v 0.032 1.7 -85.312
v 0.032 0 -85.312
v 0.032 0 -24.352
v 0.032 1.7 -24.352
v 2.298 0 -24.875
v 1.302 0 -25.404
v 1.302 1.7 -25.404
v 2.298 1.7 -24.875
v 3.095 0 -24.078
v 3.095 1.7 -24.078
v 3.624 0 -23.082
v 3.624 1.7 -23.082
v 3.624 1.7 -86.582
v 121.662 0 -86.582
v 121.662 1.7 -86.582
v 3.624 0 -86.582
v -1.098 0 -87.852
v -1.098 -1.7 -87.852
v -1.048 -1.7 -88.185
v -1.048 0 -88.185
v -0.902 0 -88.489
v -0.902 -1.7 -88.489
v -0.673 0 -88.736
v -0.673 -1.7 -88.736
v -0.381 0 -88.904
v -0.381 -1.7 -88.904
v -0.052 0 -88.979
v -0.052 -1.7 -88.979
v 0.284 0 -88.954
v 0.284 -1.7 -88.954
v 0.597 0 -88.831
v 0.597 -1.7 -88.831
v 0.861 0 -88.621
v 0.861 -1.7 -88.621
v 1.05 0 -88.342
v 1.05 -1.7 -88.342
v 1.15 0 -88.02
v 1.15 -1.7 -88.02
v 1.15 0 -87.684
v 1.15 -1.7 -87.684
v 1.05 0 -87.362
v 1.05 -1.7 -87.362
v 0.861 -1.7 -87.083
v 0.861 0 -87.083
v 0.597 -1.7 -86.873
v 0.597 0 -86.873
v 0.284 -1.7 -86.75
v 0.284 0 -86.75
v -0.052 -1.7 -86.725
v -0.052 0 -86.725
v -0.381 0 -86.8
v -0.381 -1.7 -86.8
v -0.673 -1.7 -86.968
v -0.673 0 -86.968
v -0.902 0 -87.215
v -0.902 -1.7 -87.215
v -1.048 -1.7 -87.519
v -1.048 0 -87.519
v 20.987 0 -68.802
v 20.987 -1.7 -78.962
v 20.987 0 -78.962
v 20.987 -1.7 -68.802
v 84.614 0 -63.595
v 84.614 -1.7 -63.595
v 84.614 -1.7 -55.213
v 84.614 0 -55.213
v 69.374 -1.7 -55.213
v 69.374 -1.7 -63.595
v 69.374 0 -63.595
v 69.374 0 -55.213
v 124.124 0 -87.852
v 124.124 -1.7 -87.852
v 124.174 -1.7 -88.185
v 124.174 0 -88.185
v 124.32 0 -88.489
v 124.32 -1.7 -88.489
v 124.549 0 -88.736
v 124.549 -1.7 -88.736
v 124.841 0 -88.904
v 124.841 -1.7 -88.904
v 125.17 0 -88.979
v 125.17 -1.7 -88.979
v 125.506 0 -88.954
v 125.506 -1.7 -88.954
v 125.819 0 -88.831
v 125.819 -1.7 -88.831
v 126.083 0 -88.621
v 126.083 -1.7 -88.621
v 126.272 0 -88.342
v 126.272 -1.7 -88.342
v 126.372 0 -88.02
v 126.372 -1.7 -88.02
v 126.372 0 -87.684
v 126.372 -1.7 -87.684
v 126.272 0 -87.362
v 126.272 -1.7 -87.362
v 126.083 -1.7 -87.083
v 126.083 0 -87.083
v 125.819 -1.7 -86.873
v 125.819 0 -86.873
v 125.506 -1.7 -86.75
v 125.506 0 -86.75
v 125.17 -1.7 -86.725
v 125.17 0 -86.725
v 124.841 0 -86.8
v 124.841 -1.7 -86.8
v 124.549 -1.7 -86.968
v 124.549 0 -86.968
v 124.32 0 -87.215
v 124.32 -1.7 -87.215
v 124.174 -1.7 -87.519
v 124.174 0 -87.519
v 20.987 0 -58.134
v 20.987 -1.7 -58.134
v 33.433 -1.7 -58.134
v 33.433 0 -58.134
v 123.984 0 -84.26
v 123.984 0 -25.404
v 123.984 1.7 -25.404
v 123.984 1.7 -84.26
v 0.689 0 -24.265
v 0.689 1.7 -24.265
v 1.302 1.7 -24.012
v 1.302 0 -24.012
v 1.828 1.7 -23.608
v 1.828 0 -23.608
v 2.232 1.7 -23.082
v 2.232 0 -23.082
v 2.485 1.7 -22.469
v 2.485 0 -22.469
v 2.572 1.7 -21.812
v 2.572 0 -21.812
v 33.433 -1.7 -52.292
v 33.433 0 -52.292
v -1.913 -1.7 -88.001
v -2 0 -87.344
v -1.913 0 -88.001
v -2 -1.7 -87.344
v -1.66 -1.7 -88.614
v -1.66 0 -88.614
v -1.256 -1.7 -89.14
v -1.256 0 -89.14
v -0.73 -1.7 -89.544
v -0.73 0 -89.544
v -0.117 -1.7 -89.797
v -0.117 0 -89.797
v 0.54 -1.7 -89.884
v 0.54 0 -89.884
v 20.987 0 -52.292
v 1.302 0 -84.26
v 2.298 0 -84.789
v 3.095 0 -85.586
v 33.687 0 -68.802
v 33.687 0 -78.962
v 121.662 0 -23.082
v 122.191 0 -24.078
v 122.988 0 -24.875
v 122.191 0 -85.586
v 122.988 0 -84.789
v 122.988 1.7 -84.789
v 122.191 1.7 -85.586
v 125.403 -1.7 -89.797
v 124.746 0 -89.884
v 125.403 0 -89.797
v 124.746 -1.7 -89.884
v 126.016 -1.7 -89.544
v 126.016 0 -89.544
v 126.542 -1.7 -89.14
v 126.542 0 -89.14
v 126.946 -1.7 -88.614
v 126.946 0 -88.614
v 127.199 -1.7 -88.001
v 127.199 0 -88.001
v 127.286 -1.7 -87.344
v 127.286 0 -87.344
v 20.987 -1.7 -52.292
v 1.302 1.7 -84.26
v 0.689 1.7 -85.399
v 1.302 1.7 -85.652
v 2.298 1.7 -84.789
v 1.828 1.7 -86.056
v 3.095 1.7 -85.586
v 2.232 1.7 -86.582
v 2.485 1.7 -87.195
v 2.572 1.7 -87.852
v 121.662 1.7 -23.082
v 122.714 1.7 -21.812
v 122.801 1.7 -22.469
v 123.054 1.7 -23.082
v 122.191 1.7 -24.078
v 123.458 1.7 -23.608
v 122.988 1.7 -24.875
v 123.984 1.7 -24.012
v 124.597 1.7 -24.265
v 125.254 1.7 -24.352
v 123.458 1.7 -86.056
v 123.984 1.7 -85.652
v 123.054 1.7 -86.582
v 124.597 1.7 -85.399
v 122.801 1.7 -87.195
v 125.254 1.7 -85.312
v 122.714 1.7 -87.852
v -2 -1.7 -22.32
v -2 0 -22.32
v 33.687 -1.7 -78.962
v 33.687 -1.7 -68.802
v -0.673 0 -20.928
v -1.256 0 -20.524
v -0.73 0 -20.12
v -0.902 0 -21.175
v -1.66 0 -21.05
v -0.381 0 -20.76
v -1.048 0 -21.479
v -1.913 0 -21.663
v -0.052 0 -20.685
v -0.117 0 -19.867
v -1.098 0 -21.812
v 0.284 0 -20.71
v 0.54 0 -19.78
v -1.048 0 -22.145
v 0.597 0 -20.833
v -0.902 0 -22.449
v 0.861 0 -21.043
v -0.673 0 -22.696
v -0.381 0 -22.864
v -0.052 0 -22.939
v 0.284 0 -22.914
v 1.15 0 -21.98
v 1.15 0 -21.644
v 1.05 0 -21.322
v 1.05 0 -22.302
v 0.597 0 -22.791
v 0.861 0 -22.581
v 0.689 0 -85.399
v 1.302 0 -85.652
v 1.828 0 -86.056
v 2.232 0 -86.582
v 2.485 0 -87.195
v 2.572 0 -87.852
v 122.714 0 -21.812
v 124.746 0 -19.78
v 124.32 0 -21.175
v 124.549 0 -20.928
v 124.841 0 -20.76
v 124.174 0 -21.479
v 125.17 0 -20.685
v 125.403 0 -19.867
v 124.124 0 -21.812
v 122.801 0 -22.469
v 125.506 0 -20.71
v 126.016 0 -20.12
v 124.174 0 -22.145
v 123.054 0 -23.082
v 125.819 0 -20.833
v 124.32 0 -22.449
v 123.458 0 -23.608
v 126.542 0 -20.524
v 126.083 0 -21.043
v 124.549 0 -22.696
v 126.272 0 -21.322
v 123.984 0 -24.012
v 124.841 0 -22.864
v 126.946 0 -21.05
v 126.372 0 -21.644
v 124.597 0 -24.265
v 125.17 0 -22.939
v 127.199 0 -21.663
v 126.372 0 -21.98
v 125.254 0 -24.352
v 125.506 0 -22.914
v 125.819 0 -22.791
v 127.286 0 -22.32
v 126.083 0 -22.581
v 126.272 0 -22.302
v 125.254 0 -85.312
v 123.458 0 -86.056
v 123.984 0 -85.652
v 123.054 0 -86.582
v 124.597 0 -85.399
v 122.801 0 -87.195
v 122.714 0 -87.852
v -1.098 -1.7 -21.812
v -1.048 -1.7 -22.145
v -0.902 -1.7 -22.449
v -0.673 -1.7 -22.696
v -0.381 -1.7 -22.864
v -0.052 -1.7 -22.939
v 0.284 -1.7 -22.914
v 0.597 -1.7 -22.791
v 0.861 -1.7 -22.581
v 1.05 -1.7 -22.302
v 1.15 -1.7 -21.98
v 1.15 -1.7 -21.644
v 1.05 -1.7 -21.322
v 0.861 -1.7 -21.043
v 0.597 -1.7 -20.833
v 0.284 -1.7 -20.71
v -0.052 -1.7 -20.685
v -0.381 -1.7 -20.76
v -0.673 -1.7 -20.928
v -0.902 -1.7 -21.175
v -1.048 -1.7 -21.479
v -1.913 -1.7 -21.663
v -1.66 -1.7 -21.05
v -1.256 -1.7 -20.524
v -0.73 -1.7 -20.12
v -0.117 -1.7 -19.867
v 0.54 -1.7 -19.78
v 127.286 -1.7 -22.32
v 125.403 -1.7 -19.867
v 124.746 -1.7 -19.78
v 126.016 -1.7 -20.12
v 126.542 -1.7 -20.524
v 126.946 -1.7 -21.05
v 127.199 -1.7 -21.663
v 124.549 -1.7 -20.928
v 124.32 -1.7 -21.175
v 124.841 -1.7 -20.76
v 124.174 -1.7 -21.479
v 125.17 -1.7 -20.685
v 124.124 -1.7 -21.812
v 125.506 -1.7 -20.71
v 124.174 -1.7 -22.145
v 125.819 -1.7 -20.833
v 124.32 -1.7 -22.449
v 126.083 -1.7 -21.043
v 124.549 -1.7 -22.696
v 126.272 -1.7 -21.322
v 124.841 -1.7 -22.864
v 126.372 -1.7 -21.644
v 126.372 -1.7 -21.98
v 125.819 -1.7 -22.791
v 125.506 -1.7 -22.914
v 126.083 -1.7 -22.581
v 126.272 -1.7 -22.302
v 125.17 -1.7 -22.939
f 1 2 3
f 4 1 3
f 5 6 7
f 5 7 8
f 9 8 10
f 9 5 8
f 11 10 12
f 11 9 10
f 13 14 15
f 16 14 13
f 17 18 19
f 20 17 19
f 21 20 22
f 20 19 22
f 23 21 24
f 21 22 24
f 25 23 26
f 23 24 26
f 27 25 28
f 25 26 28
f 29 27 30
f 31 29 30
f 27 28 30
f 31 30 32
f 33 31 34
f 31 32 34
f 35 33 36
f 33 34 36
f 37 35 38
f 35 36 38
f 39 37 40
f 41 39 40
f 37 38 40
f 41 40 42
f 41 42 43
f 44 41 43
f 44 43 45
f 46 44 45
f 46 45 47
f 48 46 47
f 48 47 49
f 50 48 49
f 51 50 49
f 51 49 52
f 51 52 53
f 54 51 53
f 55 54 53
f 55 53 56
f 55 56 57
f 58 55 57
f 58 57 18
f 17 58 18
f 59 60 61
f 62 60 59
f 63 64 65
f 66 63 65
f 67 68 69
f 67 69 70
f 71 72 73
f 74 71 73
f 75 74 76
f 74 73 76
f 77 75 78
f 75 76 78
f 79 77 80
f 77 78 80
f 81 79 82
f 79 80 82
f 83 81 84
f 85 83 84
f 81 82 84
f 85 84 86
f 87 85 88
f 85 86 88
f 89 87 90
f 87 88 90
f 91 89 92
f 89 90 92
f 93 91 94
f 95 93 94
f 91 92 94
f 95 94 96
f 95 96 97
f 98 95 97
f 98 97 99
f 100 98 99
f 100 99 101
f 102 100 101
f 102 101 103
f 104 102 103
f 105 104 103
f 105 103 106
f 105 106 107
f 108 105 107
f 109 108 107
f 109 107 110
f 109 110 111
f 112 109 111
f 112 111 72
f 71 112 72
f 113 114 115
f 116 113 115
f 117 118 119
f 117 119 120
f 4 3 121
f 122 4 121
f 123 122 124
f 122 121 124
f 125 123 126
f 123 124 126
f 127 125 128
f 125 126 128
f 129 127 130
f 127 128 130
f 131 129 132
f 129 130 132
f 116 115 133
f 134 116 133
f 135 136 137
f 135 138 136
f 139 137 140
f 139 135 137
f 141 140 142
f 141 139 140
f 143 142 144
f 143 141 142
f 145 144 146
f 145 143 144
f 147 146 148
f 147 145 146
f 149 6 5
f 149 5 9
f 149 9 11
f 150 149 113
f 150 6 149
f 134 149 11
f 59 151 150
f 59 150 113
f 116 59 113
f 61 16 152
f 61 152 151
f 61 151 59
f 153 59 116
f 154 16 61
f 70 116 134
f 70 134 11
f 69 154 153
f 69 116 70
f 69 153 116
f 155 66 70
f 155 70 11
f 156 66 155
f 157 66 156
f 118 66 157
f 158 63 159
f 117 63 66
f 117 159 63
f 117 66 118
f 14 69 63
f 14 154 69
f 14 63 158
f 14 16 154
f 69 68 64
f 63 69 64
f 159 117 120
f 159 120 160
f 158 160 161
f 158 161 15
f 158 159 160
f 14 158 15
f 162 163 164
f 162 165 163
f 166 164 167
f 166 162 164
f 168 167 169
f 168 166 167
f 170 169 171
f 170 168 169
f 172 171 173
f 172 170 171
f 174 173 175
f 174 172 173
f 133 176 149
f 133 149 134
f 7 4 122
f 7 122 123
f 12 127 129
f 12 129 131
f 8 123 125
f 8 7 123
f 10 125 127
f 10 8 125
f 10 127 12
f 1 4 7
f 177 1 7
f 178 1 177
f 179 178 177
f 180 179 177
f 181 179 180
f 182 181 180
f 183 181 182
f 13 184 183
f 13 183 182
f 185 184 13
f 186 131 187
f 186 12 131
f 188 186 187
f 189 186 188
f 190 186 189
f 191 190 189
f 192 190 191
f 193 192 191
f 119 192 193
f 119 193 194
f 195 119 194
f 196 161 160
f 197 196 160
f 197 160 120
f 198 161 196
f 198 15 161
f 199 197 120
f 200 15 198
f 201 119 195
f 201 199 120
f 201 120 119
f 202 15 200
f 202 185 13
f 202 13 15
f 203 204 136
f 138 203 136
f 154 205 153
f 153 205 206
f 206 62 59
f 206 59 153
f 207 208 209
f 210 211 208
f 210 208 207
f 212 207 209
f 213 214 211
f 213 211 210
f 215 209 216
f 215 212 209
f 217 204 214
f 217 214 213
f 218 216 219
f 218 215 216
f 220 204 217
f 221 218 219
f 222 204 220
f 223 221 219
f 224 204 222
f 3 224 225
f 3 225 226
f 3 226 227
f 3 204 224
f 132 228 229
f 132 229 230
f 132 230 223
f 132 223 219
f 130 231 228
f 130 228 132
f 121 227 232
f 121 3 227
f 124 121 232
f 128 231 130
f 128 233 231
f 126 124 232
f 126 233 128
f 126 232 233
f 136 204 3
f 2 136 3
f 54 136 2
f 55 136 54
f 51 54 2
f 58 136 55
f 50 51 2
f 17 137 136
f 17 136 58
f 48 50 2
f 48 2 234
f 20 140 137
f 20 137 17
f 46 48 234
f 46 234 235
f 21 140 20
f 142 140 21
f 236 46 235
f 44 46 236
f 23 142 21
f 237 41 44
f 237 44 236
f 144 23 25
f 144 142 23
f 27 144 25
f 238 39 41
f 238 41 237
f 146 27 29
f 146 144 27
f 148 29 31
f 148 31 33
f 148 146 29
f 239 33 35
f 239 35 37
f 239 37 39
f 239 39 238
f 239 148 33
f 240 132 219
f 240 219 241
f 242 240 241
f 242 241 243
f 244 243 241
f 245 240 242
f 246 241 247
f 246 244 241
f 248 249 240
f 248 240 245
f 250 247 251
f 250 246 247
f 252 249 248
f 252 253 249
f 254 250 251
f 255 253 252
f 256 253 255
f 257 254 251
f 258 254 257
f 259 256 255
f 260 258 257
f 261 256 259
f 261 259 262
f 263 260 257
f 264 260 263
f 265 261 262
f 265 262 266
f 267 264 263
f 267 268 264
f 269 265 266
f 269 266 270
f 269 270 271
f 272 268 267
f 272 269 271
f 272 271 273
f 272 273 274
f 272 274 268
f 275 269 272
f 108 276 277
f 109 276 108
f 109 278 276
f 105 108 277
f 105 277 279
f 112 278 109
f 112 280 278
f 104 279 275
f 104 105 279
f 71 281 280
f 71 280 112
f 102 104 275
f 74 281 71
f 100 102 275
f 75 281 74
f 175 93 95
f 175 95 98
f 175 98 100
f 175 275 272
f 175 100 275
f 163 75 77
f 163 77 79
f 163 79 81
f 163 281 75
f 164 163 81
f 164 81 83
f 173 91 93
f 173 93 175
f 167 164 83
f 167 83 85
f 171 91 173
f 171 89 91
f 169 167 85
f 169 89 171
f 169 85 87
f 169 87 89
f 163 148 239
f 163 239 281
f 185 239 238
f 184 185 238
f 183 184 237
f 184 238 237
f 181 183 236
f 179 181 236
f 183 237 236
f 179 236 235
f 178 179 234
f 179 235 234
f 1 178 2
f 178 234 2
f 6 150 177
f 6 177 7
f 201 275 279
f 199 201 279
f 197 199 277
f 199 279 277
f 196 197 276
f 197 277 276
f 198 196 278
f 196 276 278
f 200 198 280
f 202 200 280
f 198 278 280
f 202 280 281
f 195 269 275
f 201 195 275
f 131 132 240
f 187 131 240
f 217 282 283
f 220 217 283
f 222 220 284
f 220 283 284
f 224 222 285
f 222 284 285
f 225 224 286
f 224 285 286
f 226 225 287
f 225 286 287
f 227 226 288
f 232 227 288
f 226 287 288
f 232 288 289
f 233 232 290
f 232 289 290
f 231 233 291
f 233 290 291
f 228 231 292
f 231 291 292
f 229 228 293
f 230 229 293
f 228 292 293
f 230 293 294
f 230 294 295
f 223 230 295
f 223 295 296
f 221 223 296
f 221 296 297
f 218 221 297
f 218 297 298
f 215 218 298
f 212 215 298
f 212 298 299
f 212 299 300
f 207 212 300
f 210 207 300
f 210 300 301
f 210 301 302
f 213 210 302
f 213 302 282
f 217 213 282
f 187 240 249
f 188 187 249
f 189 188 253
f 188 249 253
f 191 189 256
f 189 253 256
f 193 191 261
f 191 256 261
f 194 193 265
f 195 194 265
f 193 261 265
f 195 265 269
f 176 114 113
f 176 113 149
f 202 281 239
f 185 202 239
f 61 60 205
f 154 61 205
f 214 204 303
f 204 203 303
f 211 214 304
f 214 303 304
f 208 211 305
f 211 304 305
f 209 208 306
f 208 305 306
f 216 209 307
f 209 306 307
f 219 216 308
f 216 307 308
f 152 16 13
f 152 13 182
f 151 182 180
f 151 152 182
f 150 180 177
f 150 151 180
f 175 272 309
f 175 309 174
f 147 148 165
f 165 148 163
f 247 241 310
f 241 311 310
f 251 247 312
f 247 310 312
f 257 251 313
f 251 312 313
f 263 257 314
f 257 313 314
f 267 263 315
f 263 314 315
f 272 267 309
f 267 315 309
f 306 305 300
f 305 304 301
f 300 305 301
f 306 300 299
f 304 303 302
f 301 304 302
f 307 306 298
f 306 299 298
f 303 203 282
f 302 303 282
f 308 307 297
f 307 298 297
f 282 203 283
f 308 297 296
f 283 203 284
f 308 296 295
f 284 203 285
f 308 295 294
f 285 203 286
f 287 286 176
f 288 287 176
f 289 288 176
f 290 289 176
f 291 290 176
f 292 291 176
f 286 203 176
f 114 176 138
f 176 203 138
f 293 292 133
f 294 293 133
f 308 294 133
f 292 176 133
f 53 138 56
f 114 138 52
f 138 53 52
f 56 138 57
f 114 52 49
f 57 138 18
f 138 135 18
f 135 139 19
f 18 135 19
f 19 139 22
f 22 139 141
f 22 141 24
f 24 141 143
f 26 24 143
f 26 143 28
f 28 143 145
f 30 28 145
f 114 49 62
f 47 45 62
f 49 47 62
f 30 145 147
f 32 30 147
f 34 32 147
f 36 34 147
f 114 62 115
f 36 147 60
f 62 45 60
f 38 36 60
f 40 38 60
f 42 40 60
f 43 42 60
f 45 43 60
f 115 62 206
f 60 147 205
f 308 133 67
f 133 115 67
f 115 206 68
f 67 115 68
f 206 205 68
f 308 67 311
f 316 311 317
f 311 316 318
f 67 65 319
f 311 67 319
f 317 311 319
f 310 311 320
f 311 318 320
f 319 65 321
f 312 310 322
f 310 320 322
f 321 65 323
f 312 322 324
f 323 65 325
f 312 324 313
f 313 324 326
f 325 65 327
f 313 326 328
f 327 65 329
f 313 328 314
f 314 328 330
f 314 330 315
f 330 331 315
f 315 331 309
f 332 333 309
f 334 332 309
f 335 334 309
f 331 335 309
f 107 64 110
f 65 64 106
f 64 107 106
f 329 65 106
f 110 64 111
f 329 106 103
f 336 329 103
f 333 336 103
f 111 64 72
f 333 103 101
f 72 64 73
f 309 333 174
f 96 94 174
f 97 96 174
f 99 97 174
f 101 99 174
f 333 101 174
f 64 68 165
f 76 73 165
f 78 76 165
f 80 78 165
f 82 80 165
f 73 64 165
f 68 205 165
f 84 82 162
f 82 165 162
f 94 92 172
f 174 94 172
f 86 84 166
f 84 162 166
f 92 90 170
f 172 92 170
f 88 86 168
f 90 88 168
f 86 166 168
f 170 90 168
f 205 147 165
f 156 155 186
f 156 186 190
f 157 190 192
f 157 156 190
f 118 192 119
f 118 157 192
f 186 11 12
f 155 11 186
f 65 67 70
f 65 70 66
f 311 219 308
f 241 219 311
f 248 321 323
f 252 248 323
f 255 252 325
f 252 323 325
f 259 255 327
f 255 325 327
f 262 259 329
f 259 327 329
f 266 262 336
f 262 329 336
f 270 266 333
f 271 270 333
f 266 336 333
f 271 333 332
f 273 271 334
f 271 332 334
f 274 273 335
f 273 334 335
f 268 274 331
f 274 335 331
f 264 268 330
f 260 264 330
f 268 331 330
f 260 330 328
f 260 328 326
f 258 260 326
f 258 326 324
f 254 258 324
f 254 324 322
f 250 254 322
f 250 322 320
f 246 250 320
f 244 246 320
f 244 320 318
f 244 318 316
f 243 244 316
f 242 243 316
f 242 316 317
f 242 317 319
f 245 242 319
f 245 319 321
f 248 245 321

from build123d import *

# Parameters (mm, degrees)
SKETCH20_W            = 129.286
SKETCH20_H            = 70.104
BOSS_EXTRUDE5_DEPTH   = 1.699999902
BOSS_EXTRUDE6_DEPTH   = 1.7
FILLET3_R             = 2.54
F_4_40_TAPPED_HOLE3_D = 2.2606
SKETCH28_W            = 15.24
SKETCH28_H            = 8.382
SKETCH28_W_2          = 12.7
SKETCH28_H_2          = 10.16
SKETCH28_W_3          = 12.446
SKETCH28_H_3          = 5.842
CUT_EXTRUDE1_DEPTH    = 2.54


with BuildPart() as part:
    # Sketch20 → Boss-Extrude5 (new body)
    with BuildSketch(Plane(origin=(0, 0, 0), x_dir=(1, 0, 0), z_dir=(0, 1, 0))):
        with Locations((62.643, 54.832)):
            Rectangle(SKETCH20_W, SKETCH20_H)
    extrude(amount=-BOSS_EXTRUDE5_DEPTH)

    # Sketch20<3> → Boss-Extrude6 (add)
    with BuildSketch(Plane(origin=(0, 0, 0), x_dir=(1, 0, 0), z_dir=(0, 1, 0))):
        with BuildLine():
            Line((2.572, 21.812), (122.714, 21.812))
            ThreePointArc((122.714, 21.812), (123.457948776, 23.608051224), (125.254, 24.352))
            Line((125.254, 24.352), (125.254, 85.312))
            ThreePointArc((125.254, 85.312), (123.457948776, 86.055948776), (122.714, 87.852))
            Line((122.714, 87.852), (2.572, 87.852))
            ThreePointArc((2.572, 87.852), (1.828051224, 86.055948776), (0.032, 85.312))
            Line((0.032, 85.312), (0.032, 24.352))
            ThreePointArc((0.032, 24.352), (1.828051224, 23.608051224), (2.572, 21.812))
        make_face()
        with BuildLine():
            Line((3.624102448, 23.082), (121.661897552, 23.082))
            ThreePointArc((121.661897552, 23.082), (122.559923164, 24.506076836), (123.984, 25.404102448))
            Line((123.984, 25.404102448), (123.984, 84.259897552))
            ThreePointArc((123.984, 84.259897552), (122.559923164, 85.157923164), (121.661897552, 86.582))
            Line((121.661897552, 86.582), (3.624102448, 86.582))
            ThreePointArc((3.624102448, 86.582), (2.726076836, 85.157923164), (1.302, 84.259897552))
            Line((1.302, 84.259897552), (1.302, 25.404102448))
            ThreePointArc((1.302, 25.404102448), (2.726076836, 24.506076836), (3.624102448, 23.082))
        make_face(mode=Mode.SUBTRACT)
    extrude(amount=BOSS_EXTRUDE6_DEPTH)

    # Fillet3
    fillet3_edges = [part.edges().sort_by_distance(p)[0] for p in [
        (-2, -0.849999951, -19.78),
        (-2, -0.849999951, -89.884),
        (127.286, -0.849999951, -89.884),
        (127.286, -0.849999951, -19.78),
    ]]
    fillet(fillet3_edges, radius=FILLET3_R)

    # #4-40 Tapped Hole3 (through all)
    with Locations(Plane(origin=(0, 0, 0), x_dir=(1, 0, 0), z_dir=(0, 1, 0))):
        with Locations((0.032, 21.812), (125.254, 21.812), (125.254, 87.852), (0.032, 87.852)):
            Hole(F_4_40_TAPPED_HOLE3_D / 2)

    # Sketch28 → Cut-Extrude1 (cut)
    with BuildSketch(Plane.XZ.offset(1.699999902)):
        with Locations((76.994, -59.404)):
            Rectangle(SKETCH28_W, SKETCH28_H)
        with Locations((27.337, -73.882)):
            Rectangle(SKETCH28_W_2, SKETCH28_H_2)
        with Locations((27.21, -55.213)):
            Rectangle(SKETCH28_W_3, SKETCH28_H_3)
    extrude(amount=-CUT_EXTRUDE1_DEPTH, mode=Mode.SUBTRACT)


solid = part.part
